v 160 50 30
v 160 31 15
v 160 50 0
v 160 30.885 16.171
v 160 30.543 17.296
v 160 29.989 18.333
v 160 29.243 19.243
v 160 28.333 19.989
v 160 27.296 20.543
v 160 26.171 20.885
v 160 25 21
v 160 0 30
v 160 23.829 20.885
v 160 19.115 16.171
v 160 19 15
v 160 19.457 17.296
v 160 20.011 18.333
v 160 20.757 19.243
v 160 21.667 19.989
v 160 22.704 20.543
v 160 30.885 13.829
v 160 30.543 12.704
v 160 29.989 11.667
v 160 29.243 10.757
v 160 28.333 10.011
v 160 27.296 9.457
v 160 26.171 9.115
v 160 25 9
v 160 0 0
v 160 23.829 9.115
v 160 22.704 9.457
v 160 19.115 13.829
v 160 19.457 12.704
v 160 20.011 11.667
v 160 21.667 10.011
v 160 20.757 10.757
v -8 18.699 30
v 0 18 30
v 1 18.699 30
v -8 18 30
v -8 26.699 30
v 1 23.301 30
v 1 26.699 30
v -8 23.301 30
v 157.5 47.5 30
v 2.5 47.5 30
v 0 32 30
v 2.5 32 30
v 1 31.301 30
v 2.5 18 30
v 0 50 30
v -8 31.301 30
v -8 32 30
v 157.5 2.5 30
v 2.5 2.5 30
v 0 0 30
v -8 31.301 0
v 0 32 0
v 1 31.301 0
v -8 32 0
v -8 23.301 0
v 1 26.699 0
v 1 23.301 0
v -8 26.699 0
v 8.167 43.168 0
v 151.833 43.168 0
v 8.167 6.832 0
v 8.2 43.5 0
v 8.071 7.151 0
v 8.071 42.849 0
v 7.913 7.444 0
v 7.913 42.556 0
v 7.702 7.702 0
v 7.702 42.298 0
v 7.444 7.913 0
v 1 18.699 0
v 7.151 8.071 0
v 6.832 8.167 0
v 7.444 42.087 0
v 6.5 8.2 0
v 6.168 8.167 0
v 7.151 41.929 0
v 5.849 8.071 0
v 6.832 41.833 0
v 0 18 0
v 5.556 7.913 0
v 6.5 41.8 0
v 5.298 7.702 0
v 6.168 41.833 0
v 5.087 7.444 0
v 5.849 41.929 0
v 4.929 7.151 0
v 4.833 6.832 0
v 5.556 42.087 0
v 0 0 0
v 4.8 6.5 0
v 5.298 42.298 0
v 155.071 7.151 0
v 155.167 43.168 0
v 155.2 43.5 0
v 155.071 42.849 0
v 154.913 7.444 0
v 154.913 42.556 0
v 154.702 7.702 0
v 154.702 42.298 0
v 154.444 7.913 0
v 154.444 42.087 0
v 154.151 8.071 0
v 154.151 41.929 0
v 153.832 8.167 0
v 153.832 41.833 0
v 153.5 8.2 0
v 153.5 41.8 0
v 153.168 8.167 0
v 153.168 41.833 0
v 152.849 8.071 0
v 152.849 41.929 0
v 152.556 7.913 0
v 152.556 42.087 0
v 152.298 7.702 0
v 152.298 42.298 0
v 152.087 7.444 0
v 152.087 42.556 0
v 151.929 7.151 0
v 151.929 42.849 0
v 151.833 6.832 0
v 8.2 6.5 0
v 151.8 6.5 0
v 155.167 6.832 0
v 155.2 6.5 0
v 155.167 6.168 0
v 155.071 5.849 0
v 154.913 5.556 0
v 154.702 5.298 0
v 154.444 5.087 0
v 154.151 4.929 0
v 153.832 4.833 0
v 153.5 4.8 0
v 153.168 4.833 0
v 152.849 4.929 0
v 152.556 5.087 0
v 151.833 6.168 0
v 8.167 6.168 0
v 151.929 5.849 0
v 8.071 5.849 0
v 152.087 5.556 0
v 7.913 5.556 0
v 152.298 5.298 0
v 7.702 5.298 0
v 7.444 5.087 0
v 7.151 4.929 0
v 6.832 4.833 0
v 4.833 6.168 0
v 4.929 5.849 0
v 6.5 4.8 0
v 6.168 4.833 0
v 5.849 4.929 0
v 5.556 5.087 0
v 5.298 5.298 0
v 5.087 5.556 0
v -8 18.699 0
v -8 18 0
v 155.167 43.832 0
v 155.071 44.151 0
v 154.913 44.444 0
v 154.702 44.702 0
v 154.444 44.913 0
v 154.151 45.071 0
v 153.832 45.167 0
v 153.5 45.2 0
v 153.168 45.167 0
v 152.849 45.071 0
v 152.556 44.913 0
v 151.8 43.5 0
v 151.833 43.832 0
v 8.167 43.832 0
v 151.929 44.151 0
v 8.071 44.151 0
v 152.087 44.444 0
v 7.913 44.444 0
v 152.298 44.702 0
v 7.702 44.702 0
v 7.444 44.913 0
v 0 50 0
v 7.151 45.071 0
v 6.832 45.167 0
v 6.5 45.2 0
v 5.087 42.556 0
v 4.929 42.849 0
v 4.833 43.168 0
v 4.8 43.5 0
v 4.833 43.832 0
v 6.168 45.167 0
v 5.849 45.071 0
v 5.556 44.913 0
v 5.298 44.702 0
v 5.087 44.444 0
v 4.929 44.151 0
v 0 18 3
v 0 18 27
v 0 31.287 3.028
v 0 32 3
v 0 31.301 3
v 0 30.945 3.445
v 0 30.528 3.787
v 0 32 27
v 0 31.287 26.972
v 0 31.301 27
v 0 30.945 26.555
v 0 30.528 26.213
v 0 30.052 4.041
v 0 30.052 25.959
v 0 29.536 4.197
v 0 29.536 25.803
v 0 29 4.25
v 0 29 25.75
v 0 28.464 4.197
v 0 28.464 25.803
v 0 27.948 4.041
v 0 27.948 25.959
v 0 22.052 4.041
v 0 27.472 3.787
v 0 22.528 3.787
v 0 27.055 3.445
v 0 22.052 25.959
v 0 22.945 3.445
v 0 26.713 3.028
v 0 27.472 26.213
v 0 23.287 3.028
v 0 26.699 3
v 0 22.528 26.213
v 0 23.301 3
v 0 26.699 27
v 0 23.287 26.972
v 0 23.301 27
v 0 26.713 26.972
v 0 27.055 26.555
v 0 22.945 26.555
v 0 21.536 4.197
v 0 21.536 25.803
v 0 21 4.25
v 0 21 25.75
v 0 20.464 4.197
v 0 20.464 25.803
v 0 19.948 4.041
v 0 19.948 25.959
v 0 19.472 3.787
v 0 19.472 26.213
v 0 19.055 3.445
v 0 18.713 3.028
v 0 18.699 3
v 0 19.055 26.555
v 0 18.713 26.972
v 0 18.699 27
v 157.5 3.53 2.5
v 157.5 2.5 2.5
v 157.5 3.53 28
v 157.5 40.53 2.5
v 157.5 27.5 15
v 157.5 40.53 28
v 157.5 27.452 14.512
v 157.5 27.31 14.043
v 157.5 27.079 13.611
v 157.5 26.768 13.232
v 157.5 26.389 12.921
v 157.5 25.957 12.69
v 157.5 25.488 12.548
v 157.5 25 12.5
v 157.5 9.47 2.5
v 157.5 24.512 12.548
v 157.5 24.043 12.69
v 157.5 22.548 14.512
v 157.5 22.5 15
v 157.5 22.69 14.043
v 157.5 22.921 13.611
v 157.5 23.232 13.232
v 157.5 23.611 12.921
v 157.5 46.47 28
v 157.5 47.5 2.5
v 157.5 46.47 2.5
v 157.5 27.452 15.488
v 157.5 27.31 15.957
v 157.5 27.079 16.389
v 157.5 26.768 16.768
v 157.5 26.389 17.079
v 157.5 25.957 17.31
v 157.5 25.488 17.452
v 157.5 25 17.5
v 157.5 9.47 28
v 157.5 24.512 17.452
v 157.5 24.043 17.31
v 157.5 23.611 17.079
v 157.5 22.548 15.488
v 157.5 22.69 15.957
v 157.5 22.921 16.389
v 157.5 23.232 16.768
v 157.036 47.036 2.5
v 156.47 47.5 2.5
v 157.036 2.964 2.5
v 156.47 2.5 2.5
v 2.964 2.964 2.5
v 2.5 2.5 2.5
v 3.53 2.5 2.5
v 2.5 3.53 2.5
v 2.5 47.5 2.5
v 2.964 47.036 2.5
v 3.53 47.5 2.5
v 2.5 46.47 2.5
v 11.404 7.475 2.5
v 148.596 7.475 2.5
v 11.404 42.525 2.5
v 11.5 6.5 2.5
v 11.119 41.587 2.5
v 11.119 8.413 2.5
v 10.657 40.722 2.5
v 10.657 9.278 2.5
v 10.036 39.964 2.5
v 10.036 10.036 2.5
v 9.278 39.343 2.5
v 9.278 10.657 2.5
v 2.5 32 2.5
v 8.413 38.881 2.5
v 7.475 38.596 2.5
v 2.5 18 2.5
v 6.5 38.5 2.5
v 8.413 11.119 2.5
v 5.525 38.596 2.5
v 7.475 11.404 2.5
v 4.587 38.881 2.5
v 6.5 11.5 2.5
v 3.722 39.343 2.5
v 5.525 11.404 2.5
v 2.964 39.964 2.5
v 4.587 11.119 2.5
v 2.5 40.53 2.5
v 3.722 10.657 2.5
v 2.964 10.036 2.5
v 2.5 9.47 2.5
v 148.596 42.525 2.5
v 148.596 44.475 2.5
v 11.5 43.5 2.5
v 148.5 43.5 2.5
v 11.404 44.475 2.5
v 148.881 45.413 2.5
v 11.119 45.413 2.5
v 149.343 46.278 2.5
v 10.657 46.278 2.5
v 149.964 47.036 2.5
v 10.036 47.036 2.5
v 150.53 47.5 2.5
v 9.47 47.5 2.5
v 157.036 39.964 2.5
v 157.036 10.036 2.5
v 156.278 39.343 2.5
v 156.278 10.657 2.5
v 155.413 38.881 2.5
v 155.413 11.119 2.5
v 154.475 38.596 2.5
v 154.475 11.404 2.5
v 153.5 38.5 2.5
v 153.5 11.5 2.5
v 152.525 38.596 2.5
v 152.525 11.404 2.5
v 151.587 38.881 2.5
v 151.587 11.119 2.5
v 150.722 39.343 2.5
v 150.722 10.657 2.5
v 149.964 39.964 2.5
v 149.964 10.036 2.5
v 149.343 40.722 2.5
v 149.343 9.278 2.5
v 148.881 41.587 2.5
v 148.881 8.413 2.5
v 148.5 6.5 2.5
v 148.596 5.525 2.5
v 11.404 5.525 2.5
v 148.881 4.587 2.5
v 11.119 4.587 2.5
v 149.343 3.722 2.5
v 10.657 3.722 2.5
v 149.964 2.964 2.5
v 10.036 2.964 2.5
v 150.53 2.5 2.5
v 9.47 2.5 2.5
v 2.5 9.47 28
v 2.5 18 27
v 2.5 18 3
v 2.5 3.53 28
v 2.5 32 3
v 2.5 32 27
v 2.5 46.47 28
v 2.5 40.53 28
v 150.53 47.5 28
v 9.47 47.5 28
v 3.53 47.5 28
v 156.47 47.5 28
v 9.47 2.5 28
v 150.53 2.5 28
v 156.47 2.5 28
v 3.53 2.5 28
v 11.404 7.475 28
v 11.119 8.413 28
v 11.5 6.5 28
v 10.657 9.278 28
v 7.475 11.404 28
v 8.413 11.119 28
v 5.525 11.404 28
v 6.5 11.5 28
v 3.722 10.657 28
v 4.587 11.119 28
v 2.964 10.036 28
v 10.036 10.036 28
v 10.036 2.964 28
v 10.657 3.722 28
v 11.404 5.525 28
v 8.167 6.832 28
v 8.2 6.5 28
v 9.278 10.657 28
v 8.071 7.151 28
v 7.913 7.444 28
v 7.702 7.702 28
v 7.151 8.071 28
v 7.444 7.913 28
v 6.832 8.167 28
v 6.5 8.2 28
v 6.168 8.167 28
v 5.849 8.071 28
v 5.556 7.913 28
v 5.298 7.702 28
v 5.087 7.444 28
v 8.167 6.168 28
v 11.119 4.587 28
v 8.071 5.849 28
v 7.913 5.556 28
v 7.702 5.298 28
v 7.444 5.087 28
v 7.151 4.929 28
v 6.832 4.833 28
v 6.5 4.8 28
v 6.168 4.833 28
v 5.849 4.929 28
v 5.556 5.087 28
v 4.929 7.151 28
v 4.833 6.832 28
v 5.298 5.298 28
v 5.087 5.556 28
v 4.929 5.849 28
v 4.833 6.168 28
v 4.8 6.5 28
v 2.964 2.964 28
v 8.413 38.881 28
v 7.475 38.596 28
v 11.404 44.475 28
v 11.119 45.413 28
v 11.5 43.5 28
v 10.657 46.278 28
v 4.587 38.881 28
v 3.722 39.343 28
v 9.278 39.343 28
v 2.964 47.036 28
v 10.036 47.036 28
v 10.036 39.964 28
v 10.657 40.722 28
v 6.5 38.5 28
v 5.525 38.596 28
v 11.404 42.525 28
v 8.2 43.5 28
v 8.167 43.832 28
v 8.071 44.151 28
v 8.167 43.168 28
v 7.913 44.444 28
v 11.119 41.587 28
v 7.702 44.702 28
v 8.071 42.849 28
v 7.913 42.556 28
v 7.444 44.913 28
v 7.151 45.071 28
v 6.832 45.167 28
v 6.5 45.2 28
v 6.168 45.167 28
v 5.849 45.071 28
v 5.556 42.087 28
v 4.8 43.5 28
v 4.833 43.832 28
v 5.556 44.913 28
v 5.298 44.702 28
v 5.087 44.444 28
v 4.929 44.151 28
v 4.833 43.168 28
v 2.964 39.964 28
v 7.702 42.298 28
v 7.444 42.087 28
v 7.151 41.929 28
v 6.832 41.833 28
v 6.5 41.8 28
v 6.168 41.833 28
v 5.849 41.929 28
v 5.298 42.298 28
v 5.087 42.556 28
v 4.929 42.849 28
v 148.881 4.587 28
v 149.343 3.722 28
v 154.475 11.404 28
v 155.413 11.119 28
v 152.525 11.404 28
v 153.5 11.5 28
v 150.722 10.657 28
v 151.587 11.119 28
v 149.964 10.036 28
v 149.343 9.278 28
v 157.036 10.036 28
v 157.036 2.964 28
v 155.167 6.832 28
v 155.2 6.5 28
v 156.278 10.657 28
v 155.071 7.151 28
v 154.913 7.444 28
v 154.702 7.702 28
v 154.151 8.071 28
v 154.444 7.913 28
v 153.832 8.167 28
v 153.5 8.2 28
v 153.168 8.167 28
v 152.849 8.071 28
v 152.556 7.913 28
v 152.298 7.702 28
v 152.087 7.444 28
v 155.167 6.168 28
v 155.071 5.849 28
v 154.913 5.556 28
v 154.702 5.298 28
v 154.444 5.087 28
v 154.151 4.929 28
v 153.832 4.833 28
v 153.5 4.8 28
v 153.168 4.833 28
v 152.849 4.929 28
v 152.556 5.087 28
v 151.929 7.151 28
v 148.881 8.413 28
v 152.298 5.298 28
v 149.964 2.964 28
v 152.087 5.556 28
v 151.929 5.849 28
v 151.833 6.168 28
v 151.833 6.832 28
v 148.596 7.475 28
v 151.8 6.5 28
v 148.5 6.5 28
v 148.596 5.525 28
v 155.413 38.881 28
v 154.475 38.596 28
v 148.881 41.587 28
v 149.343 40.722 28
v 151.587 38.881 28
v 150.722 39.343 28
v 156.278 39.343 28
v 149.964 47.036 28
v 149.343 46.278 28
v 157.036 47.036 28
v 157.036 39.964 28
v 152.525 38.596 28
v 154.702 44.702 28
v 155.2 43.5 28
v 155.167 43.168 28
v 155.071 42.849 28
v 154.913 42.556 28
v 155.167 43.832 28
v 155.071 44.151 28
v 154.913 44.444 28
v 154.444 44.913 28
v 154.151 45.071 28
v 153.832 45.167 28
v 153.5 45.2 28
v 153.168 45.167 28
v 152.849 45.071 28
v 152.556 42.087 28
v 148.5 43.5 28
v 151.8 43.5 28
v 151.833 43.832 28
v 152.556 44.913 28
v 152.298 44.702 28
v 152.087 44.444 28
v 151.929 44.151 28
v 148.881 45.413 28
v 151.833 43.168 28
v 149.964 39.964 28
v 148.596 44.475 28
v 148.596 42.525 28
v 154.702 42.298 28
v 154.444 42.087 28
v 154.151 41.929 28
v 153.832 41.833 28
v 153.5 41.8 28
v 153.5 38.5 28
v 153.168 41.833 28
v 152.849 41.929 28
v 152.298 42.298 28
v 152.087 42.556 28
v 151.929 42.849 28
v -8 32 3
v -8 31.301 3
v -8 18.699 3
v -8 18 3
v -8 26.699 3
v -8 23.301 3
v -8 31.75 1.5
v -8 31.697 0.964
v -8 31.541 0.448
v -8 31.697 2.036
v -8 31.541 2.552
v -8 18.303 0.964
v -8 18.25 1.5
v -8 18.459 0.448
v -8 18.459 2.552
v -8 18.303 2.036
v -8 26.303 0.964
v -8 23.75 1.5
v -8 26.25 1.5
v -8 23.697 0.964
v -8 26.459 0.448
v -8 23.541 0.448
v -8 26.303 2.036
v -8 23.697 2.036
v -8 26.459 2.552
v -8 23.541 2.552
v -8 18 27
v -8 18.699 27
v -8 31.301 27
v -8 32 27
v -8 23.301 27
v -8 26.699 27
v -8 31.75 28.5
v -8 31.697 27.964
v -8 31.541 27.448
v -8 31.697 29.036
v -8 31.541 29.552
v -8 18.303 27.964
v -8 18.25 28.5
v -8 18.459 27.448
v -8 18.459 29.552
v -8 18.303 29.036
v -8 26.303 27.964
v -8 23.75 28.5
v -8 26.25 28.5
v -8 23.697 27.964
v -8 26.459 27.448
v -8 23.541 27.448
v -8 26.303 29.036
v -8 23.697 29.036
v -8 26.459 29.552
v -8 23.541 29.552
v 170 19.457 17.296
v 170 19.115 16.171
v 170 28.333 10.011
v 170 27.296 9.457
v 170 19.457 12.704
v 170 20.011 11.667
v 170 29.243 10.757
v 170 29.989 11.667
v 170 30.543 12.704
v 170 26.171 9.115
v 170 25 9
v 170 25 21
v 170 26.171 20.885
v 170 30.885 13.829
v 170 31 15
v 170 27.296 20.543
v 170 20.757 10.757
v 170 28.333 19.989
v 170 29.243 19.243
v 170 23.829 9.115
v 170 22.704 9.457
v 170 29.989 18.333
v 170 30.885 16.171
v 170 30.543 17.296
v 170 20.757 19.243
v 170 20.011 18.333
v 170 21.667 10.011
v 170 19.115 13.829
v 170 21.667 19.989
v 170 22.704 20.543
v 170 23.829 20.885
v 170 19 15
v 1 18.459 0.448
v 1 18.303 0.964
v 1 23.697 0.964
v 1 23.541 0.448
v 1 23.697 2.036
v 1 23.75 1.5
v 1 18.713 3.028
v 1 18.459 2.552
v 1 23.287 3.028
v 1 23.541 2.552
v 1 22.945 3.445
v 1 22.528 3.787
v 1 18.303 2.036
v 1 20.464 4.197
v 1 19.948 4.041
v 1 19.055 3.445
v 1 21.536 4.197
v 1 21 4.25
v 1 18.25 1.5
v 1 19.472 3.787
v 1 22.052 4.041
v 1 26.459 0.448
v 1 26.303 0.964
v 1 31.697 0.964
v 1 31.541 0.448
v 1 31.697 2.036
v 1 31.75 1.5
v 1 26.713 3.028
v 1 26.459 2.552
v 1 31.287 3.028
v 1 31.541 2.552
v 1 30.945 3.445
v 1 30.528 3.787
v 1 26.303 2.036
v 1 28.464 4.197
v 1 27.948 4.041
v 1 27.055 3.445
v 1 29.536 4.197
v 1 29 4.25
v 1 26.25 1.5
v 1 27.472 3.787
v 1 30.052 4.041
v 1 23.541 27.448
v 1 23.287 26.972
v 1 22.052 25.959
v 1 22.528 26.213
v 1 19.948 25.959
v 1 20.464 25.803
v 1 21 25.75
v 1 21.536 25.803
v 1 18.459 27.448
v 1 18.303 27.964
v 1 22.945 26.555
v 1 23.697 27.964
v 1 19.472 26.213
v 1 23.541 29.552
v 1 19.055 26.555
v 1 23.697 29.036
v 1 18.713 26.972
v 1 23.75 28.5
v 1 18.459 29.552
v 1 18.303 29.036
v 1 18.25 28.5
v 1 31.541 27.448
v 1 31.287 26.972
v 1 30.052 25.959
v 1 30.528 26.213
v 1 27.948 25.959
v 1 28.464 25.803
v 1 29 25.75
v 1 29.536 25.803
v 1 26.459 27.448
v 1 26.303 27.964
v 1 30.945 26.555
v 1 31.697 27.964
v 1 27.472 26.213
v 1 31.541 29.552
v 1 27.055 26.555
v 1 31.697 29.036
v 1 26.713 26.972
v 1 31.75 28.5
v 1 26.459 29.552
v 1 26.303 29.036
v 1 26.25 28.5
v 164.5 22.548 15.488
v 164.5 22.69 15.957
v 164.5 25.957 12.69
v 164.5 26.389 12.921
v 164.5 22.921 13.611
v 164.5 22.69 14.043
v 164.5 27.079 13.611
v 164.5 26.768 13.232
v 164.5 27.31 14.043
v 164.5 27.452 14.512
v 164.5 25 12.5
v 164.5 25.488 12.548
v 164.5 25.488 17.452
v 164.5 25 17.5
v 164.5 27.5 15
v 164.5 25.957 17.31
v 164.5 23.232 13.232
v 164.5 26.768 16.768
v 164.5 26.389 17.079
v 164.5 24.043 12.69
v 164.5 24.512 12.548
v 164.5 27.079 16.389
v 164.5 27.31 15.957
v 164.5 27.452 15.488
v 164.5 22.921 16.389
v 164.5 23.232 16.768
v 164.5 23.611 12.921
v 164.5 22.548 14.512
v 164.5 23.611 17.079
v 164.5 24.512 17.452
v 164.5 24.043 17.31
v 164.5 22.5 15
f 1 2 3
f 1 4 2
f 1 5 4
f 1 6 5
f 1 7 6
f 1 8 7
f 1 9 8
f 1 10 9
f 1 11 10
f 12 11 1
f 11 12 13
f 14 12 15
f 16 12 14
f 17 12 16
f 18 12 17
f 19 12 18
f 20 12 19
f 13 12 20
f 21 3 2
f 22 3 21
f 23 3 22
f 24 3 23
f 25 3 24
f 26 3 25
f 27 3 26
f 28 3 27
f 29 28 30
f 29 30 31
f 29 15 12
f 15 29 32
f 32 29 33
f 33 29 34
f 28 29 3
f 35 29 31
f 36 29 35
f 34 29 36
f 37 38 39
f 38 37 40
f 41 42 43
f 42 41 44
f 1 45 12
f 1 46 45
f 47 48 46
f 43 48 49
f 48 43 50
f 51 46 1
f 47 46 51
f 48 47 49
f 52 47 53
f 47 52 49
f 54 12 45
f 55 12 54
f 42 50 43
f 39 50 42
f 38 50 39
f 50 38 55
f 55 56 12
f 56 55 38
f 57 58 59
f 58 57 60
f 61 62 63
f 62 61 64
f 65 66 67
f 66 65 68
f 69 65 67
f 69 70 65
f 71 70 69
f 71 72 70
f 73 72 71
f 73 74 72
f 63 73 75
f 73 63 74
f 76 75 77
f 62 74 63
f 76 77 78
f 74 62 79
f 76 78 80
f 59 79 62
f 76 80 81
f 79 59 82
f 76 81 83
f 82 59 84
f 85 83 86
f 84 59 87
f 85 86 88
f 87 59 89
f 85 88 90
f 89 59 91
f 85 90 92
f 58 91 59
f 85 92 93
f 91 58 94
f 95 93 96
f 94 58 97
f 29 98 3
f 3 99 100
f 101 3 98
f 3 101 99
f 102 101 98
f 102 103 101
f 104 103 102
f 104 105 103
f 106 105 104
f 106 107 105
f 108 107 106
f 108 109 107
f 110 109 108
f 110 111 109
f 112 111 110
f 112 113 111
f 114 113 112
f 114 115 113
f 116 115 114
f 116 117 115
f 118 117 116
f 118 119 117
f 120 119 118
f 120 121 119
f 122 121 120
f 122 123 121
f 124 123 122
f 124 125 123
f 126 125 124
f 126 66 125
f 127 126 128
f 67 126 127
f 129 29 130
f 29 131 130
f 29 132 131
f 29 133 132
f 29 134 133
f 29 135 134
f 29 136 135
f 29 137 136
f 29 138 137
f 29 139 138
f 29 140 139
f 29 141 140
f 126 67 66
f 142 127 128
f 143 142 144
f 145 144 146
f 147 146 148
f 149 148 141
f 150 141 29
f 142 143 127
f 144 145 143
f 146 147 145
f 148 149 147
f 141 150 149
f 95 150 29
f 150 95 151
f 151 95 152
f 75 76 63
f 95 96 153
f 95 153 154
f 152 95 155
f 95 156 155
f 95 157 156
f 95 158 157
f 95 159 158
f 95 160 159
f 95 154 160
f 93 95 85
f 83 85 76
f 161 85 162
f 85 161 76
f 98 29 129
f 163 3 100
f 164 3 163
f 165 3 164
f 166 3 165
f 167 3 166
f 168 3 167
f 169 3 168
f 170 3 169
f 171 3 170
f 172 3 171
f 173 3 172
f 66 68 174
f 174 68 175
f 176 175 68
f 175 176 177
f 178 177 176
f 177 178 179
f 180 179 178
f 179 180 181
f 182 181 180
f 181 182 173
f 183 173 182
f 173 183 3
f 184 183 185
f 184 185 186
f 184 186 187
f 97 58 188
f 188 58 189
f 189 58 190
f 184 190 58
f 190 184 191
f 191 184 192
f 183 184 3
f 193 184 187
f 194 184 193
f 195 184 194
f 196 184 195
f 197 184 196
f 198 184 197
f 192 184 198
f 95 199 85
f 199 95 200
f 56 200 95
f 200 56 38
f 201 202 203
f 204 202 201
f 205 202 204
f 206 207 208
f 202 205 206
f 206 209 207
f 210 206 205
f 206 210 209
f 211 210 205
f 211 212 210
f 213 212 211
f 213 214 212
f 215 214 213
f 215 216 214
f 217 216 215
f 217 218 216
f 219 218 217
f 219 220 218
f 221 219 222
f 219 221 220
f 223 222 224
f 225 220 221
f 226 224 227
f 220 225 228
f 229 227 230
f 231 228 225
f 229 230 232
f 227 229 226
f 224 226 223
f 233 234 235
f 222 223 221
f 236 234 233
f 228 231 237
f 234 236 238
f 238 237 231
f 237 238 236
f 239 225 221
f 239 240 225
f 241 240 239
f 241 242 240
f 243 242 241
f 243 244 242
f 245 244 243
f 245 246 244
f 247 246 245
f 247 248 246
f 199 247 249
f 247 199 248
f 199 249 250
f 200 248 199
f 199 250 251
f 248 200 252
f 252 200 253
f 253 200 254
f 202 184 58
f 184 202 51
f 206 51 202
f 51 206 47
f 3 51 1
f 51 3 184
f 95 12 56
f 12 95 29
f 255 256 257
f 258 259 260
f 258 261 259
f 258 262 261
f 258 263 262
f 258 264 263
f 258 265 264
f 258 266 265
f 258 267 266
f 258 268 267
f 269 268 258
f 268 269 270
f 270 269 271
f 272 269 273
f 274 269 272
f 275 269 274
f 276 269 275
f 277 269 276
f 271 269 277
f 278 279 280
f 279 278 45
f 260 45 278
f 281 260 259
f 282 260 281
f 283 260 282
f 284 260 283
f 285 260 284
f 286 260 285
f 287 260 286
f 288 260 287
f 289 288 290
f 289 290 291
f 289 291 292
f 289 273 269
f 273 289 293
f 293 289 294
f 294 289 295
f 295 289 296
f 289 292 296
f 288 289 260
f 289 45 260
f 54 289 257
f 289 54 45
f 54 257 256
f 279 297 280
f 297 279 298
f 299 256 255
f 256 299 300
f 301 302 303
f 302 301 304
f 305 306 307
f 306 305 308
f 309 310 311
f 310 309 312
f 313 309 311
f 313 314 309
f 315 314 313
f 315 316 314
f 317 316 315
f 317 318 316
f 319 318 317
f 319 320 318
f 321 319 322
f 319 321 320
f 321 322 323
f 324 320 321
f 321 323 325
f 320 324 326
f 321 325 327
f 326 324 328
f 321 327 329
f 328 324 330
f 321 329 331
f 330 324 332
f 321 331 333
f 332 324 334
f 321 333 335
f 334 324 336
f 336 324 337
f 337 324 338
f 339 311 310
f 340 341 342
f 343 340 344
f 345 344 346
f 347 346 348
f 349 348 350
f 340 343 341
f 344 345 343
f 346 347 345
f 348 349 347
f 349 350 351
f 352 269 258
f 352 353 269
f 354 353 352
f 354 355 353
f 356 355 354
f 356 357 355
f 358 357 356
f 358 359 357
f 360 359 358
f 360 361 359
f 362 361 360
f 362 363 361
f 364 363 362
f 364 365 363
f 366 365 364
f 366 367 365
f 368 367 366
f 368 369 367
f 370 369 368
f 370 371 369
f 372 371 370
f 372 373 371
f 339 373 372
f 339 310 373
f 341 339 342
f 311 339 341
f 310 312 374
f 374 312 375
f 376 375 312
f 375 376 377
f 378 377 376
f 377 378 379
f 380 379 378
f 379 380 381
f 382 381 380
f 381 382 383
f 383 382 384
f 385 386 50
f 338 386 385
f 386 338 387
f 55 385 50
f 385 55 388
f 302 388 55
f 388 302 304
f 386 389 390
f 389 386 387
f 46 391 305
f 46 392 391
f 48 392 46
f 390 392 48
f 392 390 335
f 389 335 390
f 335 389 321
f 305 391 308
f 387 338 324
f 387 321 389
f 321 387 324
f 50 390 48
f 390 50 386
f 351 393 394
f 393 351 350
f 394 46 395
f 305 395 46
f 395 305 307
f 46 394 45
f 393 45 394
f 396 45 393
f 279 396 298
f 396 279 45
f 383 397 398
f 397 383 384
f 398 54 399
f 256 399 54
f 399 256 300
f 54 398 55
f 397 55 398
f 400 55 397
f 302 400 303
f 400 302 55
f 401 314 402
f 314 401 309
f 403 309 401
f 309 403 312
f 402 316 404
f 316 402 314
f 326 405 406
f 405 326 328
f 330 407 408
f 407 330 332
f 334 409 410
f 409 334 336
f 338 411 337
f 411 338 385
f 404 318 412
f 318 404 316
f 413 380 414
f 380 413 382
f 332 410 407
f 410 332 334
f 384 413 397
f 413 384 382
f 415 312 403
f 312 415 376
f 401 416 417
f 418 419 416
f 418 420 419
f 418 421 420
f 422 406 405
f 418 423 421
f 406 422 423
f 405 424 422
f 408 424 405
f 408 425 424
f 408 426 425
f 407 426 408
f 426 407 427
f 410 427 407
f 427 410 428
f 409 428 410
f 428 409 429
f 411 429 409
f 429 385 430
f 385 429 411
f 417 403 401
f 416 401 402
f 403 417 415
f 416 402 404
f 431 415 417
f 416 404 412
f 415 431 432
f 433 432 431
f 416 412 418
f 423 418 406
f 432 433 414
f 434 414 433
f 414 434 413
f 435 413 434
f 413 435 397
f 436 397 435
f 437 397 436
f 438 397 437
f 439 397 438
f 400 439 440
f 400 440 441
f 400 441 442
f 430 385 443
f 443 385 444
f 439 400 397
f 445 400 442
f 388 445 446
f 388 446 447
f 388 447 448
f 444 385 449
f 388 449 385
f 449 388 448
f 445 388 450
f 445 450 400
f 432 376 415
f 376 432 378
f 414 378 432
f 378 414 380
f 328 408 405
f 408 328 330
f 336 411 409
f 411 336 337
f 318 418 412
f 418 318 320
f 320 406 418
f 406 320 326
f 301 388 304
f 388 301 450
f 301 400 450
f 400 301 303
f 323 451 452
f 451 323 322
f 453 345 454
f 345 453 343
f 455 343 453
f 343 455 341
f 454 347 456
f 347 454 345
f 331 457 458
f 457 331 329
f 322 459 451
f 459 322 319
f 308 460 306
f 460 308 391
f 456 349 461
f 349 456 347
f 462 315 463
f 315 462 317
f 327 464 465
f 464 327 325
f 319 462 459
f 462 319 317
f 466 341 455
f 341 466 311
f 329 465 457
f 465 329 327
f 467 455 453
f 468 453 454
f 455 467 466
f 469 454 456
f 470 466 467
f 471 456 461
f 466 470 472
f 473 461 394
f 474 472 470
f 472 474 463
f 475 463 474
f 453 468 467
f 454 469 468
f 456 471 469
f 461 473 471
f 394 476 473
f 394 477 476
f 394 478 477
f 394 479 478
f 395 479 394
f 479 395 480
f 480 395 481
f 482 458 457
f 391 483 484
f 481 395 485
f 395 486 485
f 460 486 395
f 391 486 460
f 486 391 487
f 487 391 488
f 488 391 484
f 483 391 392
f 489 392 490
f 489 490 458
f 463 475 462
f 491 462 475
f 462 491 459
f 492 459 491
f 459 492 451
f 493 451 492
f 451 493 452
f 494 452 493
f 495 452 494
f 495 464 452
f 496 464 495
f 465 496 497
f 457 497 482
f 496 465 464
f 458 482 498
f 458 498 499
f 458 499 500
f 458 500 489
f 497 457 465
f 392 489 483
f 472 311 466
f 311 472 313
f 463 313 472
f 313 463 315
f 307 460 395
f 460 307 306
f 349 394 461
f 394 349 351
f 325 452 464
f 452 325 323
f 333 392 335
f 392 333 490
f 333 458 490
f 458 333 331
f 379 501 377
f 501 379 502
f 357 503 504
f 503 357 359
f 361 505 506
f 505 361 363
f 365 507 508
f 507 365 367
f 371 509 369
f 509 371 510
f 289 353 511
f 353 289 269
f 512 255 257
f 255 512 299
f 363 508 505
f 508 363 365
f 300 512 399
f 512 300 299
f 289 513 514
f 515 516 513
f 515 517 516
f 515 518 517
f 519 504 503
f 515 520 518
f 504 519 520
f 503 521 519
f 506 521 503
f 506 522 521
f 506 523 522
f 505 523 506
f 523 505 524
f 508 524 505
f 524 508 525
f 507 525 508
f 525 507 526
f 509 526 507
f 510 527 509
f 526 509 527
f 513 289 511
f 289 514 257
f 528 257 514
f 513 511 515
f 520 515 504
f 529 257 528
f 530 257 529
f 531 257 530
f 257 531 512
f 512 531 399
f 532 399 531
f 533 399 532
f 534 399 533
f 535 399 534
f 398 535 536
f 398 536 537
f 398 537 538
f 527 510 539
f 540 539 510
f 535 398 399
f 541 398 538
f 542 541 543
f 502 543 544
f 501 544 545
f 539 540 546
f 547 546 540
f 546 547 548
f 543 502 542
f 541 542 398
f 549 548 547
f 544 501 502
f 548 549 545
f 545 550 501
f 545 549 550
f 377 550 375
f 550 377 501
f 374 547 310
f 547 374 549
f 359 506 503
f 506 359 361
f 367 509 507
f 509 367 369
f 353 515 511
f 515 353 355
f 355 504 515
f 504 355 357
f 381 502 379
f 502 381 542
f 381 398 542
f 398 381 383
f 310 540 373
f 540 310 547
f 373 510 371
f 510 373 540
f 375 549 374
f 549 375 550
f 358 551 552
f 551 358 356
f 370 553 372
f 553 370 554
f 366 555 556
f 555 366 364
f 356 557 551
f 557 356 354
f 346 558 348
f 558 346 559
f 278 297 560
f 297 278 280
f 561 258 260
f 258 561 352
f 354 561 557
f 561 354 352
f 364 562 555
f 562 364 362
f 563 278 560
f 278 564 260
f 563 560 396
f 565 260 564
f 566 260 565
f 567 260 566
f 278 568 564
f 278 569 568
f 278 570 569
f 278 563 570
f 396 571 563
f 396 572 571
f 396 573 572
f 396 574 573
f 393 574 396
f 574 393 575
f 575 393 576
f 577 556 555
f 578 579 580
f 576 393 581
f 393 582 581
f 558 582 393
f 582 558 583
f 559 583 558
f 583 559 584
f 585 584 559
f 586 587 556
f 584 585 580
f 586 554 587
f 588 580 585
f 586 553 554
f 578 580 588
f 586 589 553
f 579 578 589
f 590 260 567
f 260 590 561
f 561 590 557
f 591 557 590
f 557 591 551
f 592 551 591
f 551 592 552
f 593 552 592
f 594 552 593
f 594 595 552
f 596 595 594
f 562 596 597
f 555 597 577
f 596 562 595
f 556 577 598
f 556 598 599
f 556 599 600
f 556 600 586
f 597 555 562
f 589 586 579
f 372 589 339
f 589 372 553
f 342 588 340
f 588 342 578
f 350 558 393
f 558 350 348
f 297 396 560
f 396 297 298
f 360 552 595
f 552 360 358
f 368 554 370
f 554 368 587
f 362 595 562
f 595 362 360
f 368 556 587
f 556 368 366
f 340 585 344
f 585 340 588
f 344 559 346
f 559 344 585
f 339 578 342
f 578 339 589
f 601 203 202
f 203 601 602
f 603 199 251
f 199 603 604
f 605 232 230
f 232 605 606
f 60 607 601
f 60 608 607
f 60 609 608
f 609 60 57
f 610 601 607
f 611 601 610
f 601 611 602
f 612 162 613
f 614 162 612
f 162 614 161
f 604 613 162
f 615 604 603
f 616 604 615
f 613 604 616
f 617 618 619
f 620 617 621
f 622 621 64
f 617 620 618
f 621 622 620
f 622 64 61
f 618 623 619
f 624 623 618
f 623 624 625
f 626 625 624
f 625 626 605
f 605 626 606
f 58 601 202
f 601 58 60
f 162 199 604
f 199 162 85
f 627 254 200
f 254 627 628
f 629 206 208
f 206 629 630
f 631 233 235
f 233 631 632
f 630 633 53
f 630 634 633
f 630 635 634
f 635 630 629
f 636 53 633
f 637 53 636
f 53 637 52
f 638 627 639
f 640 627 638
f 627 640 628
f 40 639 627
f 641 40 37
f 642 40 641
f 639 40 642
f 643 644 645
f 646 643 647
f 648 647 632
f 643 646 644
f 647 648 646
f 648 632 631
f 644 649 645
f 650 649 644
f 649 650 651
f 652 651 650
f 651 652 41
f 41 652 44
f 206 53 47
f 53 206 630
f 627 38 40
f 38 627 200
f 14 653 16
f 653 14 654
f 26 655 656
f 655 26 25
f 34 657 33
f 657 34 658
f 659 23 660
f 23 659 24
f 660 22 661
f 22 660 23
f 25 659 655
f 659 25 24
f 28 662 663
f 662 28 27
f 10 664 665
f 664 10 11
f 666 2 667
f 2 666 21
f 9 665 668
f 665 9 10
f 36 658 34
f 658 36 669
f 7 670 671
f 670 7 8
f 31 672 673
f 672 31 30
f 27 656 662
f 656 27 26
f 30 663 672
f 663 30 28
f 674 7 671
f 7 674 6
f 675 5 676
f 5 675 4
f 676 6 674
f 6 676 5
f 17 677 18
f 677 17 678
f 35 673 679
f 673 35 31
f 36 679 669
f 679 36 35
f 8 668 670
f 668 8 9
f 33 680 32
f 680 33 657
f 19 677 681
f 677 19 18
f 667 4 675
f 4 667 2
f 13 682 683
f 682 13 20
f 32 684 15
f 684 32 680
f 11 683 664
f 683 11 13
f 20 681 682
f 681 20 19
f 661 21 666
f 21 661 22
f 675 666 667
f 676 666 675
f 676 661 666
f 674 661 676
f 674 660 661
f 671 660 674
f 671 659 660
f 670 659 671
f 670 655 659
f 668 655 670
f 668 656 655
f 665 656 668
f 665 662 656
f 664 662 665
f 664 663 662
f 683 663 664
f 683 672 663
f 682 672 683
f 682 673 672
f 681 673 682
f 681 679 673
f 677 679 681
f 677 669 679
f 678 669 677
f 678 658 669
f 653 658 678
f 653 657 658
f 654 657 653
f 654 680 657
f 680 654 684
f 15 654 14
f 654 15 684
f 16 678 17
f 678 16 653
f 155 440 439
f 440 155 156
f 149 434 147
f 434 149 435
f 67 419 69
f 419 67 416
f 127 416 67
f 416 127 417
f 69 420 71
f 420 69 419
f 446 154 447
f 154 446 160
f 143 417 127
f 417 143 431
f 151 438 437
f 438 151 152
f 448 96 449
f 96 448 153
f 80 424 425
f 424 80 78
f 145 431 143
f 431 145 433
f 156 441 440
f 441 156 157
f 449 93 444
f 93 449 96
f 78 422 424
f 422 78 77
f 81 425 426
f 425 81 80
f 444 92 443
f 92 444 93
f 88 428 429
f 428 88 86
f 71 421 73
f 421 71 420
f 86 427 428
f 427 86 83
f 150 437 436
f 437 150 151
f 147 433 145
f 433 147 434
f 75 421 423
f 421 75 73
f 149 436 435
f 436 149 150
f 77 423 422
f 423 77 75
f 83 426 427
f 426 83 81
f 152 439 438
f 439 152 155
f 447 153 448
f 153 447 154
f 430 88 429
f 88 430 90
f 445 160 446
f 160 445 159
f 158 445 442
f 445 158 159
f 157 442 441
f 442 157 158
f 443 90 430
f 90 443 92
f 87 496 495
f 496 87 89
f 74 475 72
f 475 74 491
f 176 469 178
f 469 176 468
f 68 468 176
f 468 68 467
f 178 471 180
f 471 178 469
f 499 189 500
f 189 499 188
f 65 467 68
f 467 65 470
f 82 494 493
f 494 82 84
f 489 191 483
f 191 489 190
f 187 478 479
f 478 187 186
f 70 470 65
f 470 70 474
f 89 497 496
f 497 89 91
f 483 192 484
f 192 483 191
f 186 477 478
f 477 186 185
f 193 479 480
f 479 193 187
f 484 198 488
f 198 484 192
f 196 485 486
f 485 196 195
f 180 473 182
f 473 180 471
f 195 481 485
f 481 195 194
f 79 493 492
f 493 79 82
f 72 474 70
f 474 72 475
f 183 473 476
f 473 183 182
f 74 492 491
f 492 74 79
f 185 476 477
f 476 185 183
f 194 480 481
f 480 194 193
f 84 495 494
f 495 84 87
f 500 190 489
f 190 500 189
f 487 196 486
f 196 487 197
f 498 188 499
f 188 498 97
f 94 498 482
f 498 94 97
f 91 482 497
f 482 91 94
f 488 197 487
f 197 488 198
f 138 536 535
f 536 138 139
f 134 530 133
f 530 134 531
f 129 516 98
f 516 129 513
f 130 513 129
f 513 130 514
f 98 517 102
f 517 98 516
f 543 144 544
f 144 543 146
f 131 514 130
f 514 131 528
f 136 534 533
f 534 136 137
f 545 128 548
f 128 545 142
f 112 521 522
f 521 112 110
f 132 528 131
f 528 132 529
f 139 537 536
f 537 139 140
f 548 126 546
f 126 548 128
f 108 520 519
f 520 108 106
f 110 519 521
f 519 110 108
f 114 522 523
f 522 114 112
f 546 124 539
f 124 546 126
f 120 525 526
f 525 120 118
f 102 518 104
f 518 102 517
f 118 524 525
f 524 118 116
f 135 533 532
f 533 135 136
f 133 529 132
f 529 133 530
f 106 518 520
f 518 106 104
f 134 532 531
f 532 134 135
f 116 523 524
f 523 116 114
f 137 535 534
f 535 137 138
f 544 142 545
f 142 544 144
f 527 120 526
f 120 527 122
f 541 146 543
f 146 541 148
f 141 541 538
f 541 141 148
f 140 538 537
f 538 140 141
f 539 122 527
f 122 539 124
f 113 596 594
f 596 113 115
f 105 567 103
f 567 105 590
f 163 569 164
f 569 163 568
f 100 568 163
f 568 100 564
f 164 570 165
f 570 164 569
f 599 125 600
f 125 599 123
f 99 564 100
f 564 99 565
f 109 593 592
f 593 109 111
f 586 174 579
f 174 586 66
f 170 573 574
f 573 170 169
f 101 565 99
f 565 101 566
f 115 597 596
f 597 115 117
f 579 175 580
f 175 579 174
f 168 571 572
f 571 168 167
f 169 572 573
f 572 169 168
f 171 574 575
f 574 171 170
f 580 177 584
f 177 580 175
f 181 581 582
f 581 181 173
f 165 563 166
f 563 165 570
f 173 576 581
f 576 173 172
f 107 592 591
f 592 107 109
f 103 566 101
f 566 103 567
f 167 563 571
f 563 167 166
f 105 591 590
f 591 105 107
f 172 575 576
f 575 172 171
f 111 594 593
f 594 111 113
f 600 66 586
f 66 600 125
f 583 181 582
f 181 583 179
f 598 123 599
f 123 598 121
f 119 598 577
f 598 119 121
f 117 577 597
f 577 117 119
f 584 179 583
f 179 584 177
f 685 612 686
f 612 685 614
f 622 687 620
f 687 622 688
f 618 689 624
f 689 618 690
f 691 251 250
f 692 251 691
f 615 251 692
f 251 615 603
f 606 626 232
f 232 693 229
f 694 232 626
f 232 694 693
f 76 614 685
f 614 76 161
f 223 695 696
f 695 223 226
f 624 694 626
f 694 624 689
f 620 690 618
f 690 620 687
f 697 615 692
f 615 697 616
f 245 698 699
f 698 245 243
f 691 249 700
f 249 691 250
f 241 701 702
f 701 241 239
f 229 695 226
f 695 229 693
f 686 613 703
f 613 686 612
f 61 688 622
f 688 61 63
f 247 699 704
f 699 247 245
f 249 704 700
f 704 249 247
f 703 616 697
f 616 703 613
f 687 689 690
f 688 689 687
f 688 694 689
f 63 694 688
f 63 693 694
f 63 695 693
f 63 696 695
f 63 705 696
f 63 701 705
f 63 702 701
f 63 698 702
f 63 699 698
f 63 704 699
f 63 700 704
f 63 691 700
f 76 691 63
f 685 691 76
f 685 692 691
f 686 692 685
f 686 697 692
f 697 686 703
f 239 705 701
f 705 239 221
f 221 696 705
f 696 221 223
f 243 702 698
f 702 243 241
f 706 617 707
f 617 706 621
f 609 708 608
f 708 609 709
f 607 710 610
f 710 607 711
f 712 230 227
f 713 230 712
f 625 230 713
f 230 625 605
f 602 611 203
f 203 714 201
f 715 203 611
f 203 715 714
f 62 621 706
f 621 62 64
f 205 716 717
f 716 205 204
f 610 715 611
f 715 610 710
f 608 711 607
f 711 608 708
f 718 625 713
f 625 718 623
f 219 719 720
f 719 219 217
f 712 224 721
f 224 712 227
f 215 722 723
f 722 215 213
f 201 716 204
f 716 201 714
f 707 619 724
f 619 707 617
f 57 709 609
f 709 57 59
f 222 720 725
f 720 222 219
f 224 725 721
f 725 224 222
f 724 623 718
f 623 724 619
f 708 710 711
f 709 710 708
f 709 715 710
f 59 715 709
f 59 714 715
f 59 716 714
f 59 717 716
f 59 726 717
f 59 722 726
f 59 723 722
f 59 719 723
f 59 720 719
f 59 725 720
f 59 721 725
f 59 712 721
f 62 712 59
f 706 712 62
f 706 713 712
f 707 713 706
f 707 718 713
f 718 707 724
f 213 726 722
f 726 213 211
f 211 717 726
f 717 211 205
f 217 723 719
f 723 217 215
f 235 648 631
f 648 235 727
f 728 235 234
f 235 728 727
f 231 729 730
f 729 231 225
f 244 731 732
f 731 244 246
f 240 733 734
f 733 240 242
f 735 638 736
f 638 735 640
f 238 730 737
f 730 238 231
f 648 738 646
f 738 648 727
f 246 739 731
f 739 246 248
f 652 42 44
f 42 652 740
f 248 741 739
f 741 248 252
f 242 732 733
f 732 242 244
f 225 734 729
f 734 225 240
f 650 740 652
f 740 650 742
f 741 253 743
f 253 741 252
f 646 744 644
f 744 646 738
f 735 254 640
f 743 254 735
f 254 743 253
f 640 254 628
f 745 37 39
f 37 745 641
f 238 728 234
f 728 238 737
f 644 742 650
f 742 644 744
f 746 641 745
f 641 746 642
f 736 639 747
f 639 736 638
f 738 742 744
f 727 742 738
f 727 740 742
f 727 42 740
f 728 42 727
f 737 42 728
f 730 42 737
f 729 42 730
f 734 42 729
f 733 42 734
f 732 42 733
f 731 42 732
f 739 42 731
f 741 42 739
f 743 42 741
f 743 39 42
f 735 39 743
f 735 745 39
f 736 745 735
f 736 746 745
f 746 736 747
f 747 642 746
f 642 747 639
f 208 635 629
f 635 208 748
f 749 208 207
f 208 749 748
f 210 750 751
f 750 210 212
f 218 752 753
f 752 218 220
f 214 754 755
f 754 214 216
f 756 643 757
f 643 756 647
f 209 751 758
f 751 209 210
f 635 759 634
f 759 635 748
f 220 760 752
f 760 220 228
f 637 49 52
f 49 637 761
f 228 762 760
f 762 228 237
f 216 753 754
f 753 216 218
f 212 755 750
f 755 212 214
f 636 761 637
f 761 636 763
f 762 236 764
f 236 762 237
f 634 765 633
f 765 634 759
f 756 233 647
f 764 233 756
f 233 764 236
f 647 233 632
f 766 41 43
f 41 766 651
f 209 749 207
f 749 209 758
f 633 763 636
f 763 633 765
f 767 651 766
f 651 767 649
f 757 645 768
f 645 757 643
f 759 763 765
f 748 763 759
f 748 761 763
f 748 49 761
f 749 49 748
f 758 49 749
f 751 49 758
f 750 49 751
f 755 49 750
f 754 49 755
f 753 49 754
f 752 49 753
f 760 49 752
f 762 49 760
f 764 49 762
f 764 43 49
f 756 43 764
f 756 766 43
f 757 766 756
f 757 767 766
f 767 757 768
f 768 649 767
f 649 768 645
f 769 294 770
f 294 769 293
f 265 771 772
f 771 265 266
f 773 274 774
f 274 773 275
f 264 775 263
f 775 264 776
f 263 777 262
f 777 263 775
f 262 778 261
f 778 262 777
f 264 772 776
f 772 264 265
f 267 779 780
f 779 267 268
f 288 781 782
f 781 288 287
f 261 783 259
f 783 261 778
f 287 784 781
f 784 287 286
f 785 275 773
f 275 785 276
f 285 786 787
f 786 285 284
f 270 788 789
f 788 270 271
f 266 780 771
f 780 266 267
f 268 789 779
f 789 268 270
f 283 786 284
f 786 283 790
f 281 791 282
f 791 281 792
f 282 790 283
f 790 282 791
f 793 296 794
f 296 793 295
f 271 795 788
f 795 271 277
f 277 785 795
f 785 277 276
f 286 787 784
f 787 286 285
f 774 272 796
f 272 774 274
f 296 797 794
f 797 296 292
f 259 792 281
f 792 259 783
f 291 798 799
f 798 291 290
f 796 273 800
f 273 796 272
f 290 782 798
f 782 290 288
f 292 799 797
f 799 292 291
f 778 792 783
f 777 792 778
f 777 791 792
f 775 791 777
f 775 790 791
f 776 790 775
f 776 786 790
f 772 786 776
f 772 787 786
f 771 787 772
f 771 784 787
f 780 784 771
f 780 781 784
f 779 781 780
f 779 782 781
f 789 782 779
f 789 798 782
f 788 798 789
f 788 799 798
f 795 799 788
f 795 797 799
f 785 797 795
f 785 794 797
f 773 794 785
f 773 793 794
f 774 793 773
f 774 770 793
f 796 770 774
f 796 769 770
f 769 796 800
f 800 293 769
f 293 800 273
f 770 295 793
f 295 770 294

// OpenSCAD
$fn = 32;

// ----------------------------------------------------------------------
// Enclosure body: 160 x 50 x 30 mm, wall 2.5 mm
// ----------------------------------------------------------------------

// --- parameters (mm) ---
length = 160;             // outside length, X
width = 50;               // outside width, Y
height = 30;              // outside height, Z
wall = 2.5;               // side wall thickness
floor_t = 2.5;            // floor thickness
boss_d = 10;              // corner boss diameter
boss_h = 25.5;            // corner boss height above the floor
boss_hole_d = 3.4;        // lid screw clearance in the boss
boss_lip = 6.5;           // boss centre inset from the corner
ear_w = 14;               // mounting ear width
ear_t = 3;                // mounting ear thickness
ear_ext = 8;              // mounting ear reach
ear_hole_d = 5.5;         // mounting ear drills
nipple_d = 12;            // cable gland boss diameter
nipple_h = 10;            // cable gland boss height
nipple_bore = 5;          // cable gland bore

module shell() {
  difference() {
    cube([length, width, height]);
    /* hollow, open at the top */
    translate([wall, wall, floor_t])
      cube([length - 2 * wall, width - 2 * wall, height]);
  }
}

module bosses() {
  /* corner bosses, sunk 1 mm into the floor */
  for (sx = [0, 1]) for (sy = [0, 1])
    translate([sx * (length - 2 * boss_lip) + boss_lip, sy * (width - 2 * boss_lip) + boss_lip, floor_t - 1])
      cylinder(h = boss_h + 1, d = boss_d);
}

module gland() {
  /* boss on the short wall, sunk 1 mm into it */
  translate([length - 1, width / 2, height * 0.5]) rotate([0, 90, 0])
    cylinder(h = nipple_h + 1, d = nipple_d);
}

module ears() {
  /* mounting ears on the short walls, sunk into the wall */
  for (sz = [0, 1])
    translate([-ear_ext, width / 2 - ear_w / 2, sz * (height - ear_t)])
      cube([ear_ext + 2.5, ear_w, ear_t]);
}

difference() {
  union() {
    shell();
    bosses();
    gland();
    ears();
  }
  /* boss screw holes */
  for (sx = [0, 1]) for (sy = [0, 1])
    translate([sx * (length - 2 * boss_lip) + boss_lip, sy * (width - 2 * boss_lip) + boss_lip, -1]) cylinder(h = floor_t + boss_h + 2, d = boss_hole_d);
  translate([length, width / 2, height * 0.5]) rotate([0, 90, 0]) translate([0, 0, -nipple_h - 2]) cylinder(h = nipple_h + wall + 4, d = nipple_bore);
  for (sz = [0, 1]) for (sx = [0, 1]) translate([-ear_ext - 1, width / 2 + (2 * sx - 1) * (ear_w / 2 - 3), sz * (height - ear_t) + ear_t / 2]) rotate([0, 90, 0]) cylinder(h = ear_ext + 2, d = ear_hole_d);
}
